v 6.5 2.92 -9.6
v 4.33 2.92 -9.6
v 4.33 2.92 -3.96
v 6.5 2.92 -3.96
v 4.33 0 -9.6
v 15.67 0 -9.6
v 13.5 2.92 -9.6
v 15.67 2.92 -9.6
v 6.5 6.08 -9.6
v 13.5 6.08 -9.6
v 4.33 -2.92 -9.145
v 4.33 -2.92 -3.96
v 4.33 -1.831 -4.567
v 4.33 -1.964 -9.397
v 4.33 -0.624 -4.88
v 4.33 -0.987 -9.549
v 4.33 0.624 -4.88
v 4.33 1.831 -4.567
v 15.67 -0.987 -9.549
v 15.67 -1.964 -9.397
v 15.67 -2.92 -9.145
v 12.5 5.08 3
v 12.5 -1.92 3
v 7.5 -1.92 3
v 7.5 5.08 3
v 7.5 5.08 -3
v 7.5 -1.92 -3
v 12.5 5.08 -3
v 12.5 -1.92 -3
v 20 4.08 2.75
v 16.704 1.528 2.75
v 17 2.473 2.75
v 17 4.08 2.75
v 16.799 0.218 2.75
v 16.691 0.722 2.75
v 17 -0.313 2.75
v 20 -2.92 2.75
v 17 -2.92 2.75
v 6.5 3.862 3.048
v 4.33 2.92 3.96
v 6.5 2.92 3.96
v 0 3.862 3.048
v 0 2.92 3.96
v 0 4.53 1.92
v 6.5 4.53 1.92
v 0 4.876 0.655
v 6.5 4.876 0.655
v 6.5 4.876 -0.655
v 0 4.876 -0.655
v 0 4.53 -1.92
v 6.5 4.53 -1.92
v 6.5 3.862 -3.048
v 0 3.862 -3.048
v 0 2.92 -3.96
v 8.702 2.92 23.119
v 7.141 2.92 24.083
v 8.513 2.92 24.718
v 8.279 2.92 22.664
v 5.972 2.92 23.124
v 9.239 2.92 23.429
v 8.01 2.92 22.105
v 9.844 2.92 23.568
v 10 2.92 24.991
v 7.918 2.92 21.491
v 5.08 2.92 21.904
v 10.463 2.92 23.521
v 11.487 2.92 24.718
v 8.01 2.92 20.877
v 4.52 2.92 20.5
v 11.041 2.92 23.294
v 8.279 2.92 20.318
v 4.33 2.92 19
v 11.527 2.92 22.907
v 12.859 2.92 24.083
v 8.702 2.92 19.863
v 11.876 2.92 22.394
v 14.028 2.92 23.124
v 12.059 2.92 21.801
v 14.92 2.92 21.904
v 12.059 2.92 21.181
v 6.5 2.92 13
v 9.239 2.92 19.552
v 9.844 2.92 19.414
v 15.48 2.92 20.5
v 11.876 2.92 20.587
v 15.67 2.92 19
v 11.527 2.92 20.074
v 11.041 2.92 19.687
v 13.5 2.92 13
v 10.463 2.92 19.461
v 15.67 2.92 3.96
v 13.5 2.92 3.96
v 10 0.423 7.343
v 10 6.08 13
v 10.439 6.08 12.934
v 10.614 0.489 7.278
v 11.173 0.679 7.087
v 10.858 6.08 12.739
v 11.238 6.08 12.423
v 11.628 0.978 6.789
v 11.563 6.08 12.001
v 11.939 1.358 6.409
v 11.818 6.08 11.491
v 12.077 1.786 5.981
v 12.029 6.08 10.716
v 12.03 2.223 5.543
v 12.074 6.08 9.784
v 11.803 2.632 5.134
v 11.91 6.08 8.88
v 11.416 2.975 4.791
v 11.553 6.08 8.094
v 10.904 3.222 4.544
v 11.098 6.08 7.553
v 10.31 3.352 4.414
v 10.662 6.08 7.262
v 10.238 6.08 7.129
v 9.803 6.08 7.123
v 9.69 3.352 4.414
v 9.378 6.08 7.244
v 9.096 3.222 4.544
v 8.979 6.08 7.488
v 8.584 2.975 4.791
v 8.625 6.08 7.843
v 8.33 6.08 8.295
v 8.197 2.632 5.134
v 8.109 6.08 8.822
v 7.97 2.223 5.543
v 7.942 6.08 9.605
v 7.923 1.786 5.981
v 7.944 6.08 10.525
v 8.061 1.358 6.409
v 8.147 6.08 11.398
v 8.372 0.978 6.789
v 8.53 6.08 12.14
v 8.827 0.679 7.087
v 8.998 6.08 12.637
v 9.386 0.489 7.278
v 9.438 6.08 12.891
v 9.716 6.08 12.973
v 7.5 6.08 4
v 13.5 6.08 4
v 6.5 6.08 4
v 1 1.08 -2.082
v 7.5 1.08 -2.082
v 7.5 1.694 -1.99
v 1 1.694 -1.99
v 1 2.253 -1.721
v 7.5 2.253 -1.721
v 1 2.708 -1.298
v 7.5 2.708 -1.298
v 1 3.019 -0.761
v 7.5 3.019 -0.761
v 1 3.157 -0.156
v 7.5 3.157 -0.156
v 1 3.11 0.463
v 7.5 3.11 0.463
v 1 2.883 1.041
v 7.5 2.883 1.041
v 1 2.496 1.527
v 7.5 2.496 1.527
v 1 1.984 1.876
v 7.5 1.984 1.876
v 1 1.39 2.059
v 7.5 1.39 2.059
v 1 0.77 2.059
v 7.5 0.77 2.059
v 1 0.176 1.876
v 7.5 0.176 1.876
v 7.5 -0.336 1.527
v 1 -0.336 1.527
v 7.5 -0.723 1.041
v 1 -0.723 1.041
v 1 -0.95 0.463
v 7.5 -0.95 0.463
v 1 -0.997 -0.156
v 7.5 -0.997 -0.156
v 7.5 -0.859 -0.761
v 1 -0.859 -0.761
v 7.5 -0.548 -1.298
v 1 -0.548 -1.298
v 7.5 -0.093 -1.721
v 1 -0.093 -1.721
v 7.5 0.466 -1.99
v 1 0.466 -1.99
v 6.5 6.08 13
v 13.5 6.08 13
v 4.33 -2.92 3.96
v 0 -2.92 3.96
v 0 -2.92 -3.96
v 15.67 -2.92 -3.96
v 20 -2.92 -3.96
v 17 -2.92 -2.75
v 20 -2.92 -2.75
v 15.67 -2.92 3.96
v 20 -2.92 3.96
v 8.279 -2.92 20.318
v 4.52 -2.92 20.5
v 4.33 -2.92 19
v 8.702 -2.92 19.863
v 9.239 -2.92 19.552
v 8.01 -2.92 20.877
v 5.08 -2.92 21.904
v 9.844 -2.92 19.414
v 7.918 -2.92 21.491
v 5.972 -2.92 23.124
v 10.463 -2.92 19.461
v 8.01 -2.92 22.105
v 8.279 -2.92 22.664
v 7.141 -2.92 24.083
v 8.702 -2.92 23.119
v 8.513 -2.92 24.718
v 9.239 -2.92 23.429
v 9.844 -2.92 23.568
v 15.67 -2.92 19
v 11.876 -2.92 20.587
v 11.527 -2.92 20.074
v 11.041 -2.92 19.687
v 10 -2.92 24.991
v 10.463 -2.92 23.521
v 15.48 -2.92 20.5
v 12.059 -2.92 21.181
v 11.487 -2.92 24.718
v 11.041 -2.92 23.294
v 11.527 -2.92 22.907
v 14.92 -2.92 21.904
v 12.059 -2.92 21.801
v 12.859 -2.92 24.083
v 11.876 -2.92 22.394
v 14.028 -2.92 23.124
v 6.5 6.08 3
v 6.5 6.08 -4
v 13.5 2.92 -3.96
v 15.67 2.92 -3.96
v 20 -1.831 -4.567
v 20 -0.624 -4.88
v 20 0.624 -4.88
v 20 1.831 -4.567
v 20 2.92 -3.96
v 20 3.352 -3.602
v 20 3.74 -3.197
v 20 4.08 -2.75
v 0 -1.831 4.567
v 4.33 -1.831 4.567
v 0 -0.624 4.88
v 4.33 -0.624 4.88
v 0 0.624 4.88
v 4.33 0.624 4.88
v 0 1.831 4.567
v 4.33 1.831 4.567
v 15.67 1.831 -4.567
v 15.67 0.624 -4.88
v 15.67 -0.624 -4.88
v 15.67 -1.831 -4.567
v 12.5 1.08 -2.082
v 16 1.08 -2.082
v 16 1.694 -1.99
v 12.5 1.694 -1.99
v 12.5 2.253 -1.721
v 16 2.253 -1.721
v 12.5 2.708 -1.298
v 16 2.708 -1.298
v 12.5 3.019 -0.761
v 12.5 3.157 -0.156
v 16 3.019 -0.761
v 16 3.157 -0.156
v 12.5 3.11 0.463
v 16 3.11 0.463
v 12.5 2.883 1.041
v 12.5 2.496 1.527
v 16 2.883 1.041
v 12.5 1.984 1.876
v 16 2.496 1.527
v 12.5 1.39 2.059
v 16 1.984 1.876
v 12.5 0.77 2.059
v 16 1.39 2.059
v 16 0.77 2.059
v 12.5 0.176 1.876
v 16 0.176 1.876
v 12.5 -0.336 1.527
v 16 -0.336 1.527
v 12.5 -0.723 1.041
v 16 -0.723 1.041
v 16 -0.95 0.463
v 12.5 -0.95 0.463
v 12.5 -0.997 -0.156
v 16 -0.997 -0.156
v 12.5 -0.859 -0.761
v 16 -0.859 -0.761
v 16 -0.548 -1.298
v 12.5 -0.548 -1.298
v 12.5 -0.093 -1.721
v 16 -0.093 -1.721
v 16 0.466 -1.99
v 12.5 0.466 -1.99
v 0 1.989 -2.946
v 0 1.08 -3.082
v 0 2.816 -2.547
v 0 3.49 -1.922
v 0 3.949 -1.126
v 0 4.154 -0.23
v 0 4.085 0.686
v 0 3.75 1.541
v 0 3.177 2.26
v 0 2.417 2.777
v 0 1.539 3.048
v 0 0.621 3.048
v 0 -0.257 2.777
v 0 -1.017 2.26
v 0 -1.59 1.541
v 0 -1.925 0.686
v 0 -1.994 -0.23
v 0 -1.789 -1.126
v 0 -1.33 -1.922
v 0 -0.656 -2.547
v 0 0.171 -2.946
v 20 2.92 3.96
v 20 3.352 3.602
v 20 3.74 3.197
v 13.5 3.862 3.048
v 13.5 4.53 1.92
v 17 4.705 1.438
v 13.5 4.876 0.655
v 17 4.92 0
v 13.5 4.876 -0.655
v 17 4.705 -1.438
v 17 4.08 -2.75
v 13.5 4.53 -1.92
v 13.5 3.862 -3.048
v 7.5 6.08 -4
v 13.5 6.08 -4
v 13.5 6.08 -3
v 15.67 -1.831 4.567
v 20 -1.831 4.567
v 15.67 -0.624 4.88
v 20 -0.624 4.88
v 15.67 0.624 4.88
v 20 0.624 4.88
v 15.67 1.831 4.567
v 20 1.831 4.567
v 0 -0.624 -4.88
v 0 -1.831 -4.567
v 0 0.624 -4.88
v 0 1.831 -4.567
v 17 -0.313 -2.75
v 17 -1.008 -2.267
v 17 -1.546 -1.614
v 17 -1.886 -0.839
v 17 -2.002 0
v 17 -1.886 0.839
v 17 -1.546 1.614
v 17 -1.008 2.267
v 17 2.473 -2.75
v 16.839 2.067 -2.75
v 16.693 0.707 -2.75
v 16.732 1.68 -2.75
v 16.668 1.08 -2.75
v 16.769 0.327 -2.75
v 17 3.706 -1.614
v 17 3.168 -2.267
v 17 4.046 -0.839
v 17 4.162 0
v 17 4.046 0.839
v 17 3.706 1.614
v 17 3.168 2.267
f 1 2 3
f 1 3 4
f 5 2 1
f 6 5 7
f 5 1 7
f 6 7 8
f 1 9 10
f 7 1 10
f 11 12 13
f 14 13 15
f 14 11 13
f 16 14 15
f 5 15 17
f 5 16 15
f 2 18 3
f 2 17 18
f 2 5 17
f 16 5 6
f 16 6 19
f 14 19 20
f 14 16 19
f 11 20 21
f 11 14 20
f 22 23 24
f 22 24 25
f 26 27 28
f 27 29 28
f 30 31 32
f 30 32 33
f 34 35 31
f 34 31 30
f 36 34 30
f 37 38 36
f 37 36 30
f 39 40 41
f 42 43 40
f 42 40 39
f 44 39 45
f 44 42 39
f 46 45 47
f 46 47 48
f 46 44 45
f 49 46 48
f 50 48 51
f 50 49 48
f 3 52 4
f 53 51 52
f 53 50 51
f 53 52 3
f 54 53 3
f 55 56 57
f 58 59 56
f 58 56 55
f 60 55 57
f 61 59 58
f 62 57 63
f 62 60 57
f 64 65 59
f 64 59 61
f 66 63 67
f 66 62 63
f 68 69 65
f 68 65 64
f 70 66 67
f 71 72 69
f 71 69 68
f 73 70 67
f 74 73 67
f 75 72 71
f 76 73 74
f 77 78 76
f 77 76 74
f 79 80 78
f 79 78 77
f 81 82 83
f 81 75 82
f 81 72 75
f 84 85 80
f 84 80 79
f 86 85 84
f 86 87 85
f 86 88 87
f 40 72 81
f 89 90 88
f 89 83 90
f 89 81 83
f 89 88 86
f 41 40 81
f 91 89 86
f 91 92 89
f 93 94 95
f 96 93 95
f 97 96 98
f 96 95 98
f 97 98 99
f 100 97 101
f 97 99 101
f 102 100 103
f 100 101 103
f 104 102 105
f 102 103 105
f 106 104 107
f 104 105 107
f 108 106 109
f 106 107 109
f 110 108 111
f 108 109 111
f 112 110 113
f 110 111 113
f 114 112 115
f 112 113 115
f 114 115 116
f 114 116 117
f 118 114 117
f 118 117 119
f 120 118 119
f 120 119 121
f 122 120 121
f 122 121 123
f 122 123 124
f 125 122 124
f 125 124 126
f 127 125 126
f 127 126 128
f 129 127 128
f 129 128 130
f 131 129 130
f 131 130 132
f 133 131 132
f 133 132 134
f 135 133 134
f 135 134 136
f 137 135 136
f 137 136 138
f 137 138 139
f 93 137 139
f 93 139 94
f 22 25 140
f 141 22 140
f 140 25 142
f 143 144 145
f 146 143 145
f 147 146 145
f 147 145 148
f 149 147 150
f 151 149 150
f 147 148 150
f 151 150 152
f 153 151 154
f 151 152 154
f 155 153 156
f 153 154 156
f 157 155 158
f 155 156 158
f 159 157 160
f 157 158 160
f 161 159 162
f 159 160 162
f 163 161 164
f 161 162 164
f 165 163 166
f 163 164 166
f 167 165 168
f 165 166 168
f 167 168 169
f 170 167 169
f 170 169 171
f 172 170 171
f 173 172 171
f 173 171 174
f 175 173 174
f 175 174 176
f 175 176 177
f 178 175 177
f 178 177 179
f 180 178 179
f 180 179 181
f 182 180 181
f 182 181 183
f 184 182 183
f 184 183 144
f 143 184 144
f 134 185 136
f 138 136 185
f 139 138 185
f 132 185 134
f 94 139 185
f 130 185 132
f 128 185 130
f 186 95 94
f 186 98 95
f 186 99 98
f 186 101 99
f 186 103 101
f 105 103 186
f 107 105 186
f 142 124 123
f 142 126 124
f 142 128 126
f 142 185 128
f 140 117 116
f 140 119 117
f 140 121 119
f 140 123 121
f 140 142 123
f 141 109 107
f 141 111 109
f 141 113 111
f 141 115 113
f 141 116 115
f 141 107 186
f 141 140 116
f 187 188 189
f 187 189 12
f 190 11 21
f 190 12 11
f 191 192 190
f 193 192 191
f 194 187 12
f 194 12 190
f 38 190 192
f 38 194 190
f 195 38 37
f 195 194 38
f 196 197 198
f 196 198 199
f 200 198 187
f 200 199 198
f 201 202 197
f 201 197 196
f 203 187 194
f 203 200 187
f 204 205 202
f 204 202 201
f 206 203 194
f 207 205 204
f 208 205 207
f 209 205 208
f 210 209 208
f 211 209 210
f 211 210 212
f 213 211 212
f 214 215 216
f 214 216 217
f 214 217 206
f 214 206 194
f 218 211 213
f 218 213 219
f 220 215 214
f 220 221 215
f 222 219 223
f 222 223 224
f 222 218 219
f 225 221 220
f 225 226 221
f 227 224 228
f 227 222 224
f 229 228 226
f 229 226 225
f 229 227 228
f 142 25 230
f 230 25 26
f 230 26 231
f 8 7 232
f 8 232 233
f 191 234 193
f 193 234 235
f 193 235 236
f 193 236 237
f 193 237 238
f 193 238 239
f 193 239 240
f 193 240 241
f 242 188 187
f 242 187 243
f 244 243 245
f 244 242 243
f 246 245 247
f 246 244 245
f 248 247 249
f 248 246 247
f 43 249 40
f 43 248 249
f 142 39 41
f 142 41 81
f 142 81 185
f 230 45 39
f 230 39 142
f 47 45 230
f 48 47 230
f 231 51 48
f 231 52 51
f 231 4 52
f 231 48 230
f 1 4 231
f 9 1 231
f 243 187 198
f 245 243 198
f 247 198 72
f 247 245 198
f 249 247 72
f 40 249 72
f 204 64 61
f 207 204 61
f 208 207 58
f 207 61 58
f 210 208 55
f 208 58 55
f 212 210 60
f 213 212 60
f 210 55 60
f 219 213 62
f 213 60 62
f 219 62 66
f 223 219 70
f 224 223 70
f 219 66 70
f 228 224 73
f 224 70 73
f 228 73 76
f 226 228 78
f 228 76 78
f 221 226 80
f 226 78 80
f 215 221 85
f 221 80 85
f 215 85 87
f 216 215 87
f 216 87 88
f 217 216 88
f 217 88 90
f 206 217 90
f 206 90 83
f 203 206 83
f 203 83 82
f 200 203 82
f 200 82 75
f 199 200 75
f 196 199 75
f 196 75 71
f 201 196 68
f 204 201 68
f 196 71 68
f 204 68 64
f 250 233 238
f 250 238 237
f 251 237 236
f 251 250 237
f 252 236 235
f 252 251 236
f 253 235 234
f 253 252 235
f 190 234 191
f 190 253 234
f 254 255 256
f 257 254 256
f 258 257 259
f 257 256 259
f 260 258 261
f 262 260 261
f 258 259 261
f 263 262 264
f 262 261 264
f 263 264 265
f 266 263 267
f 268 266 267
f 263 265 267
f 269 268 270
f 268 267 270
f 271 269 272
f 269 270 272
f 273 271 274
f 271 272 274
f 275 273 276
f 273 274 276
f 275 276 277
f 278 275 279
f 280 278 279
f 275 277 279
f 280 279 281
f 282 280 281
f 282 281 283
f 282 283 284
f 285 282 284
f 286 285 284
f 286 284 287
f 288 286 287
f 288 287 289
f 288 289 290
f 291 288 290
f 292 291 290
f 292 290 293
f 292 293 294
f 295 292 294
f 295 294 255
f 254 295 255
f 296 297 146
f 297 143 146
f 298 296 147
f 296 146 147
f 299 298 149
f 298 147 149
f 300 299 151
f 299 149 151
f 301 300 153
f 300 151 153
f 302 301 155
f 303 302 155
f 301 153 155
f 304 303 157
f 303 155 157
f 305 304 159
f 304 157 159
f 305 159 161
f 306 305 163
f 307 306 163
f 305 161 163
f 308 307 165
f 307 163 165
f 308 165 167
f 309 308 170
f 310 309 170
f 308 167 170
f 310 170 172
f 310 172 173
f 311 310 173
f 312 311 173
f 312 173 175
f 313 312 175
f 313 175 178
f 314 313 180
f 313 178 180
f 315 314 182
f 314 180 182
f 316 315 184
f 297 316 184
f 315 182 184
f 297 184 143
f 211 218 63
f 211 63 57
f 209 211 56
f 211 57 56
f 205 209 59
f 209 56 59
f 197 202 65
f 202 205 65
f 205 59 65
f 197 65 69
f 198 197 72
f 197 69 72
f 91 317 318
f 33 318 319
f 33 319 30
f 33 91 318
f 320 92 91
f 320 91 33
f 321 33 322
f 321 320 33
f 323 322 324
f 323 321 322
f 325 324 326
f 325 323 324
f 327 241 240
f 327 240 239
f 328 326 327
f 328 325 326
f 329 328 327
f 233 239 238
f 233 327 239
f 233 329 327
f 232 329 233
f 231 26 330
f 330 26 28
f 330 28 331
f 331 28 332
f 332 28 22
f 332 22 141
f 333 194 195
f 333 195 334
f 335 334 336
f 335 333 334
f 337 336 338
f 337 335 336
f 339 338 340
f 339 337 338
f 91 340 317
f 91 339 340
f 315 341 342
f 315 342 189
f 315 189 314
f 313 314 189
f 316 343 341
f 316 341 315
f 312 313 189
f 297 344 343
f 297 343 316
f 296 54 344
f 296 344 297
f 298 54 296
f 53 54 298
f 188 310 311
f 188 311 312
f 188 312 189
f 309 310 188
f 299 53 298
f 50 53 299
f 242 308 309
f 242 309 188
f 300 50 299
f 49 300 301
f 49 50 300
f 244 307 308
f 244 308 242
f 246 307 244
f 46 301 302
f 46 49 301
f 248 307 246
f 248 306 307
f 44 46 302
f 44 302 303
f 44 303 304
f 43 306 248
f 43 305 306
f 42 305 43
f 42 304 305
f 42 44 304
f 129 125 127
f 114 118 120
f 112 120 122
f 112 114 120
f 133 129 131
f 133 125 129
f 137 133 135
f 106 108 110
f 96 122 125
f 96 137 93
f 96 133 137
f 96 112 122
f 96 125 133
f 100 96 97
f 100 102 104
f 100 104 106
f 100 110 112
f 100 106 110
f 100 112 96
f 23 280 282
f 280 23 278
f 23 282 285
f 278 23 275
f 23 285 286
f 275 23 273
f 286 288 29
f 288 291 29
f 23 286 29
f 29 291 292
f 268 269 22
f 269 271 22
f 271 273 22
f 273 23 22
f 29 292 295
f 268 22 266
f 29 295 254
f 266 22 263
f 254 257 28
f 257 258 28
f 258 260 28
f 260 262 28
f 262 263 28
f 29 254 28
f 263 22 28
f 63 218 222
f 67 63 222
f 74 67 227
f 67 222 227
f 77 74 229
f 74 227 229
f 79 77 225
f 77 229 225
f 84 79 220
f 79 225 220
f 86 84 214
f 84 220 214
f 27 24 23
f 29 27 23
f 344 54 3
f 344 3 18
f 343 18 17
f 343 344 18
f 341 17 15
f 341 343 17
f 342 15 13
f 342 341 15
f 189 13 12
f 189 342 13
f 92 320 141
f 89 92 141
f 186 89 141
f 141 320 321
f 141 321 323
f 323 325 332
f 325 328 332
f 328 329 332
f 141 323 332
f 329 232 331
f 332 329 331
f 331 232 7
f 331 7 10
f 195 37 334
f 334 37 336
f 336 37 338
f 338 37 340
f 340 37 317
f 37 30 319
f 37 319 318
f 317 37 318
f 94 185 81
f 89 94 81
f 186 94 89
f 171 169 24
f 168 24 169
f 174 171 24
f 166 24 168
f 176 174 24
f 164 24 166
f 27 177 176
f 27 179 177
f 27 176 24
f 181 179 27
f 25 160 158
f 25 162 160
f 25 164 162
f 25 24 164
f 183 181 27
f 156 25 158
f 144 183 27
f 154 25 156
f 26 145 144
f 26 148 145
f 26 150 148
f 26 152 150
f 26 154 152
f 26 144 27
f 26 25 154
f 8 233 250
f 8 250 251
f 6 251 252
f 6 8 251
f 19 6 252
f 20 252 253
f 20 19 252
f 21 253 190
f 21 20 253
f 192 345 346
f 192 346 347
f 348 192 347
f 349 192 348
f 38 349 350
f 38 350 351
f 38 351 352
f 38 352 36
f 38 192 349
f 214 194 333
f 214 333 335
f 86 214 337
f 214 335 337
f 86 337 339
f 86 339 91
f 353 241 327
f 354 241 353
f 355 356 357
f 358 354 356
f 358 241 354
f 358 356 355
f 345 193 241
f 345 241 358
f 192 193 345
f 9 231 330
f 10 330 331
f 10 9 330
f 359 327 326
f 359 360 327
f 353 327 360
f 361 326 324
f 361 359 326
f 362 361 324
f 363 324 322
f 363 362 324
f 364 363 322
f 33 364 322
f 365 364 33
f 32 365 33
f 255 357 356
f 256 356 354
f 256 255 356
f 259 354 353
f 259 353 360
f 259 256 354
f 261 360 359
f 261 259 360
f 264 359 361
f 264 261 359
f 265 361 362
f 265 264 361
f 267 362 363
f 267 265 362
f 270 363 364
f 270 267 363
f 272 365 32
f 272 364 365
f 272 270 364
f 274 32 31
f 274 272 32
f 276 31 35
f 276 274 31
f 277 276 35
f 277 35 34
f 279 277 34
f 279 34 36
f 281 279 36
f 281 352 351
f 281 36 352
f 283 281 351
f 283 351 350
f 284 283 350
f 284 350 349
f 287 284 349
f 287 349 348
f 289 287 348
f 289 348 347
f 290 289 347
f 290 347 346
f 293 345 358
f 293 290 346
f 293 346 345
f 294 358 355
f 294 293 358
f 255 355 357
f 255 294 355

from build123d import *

# Parameters (mm, degrees)
BOSS_EXTRUDE1_DEPTH      = 20
SKETCH3_W                = 11.34
SKETCH3_H                = 5.84
BOSS_EXTRUDE2_DEPTH      = 25
FILLET1_R                = 6
SKETCH4_W                = 7
SKETCH4_H                = 8
BOSS_EXTRUDE3_DEPTH      = 9
BOSS_EXTRUDE4_DEPTH      = 13
BOSS_EXTRUDE4_DEPTH_BACK = 9.6
SKETCH10_W               = 7
SKETCH10_H               = 3.16
SKETCH5_W                = 5
SKETCH5_H                = 6
CUT_EXTRUDE1_DEPTH       = 9
SKETCH6_R                = 2.0825
CUT_EXTRUDE2_DEPTH       = 5.84
CUT_EXTRUDE3_REACH       = 34.581
SKETCH8_R                = 2.0825
CUT_EXTRUDE4_REACH       = 35.25
CUT_EXTRUDE4_END_RADIUS  = 4.92
CUT_EXTRUDE5_DEPTH       = 11.34
SKETCH13_R               = 2.0825
CUT_EXTRUDE7_DEPTH       = 8
SKETCH14_W               = 5
SKETCH14_H               = 6
BOSS_EXTRUDE5_DEPTH      = 1


with BuildPart() as part:
    # Sketch2 → Boss-Extrude1 (new body)
    with BuildSketch(Plane(origin=(0, 0, 0), x_dir=(0, 0, -1), z_dir=(1, 0, 0))):
        with BuildLine():
            Line((3.959797975, -2.92), (-3.959797975, -2.92))
            ThreePointArc((-3.959797975, -2.92), (-4.92, 0), (-3.959797975, 2.92))
            ThreePointArc((-3.959797975, 2.92), (0, 4.92), (3.959797975, 2.92))
            ThreePointArc((3.959797975, 2.92), (4.92, 0), (3.959797975, -2.92))
        make_face()
    extrude(amount=BOSS_EXTRUDE1_DEPTH)

    # Sketch3 → Boss-Extrude2 (add)
    with BuildSketch(Plane.XY):
        with Locations((10, 0)):
            Rectangle(SKETCH3_W, SKETCH3_H)
    extrude(amount=BOSS_EXTRUDE2_DEPTH)

    # Fillet1
    # the kernel refuses this fillet: 6 mm, written as the material it takes off along each edge
    with BuildSketch(Plane(origin=(15.67, -17.92, 25), x_dir=(0, 0, -1), z_dir=(0, 1, 0)), Plane(origin=(4.33, 17.92, 25), x_dir=(0, 0, -1), z_dir=(0, -1, 0))) as fillet1_piece_1:
        with BuildLine():
            CenterArc((FILLET1_R, FILLET1_R), FILLET1_R, 180, 90)
            Line((0, FILLET1_R), (0, 0))
            Line((0, 0), (FILLET1_R, 0))
        make_face()
    extrude(amount=35.84, mode=Mode.SUBTRACT)

    # Sketch4 → Boss-Extrude3 (add)
    with BuildSketch(Plane.XZ.offset(2.92)):
        with Locations((10, 0.040202025)):
            Rectangle(SKETCH4_W, SKETCH4_H)
    extrude(amount=-BOSS_EXTRUDE3_DEPTH)

    # Sketch10 → Boss-Extrude4 (add, two sides: drawn at the far end of the back side and taken through both)
    with BuildSketch(Plane.XY.offset(-BOSS_EXTRUDE4_DEPTH_BACK)):
        with Locations((10, 4.5)):
            Rectangle(SKETCH10_W, SKETCH10_H)
        Polygon((6.5, 2.92), (13.5, 2.92), (15.67, 2.92), (15.67, -2.92), (10, -2.92), (4.33, -2.92), (4.33, 2.92), align=None)
    extrude(amount=BOSS_EXTRUDE4_DEPTH + BOSS_EXTRUDE4_DEPTH_BACK)

    # Sketch5 → Cut-Extrude1 (cut)
    with BuildSketch(Plane(origin=(0, 6.08, 0), x_dir=(1, 0, 0), z_dir=(0, 1, 0))):
        with Locations((10, 0)):
            Rectangle(SKETCH5_W, SKETCH5_H)
    extrude(amount=-CUT_EXTRUDE1_DEPTH, mode=Mode.SUBTRACT)

    # Sketch6 → Cut-Extrude2 (cut)
    with BuildSketch(Plane(origin=(0, 2.92, 0), x_dir=(1, 0, 0), z_dir=(0, 1, 0))):
        with Locations(Location((10, -21.490918127, 0), (0, 0, 180))):
            Circle(SKETCH6_R)
    extrude(amount=-CUT_EXTRUDE2_DEPTH, mode=Mode.SUBTRACT)

    # Cut-Extrude3: up to this face of the body (flat: up to its plane)
    cut_extrude3_end = Plane(part.part.faces().sort_by_distance((0, 0.637144392, 0))[0])
    # Sketch8 → Cut-Extrude3 (cut, up to the picked face)
    with BuildSketch(Plane(origin=(20, 0, 0), x_dir=(0, 0, -1), z_dir=(1, 0, 0)), mode=Mode.PRIVATE) as cut_extrude3_sk1:
        with Locations((0, 1.08)):
            Circle(SKETCH8_R)
    cut_extrude3_tool1 = split(extrude(cut_extrude3_sk1.sketch, amount=-CUT_EXTRUDE3_REACH, mode=Mode.PRIVATE), bisect_by=cut_extrude3_end, keep=Keep.BOTH, mode=Mode.PRIVATE)
    add(cut_extrude3_tool1.solids().sort_by(Axis((20, 1.08, 0), (-1, 0, 0)))[0], mode=Mode.SUBTRACT)

    # Cut-Extrude4: up to this cylinder (the profile starts inside it)
    cut_extrude4_end = Plane(origin=(18.5, 0, 0), z_dir=(-1, 0, 0)) * Cylinder(CUT_EXTRUDE4_END_RADIUS, 81.34, mode=Mode.PRIVATE)
    # Sketch9 → Cut-Extrude4 (cut, up to the surface)
    with BuildSketch(Plane(origin=(0, -2.92, 0), x_dir=(1, 0, 0), z_dir=(0, 1, 0)), mode=Mode.PRIVATE) as cut_extrude4_sk1:
        Polygon((17, -2.75), (20, -2.75), (20, -2.0825), (20, 2.0825), (20, 2.75), (17, 2.75), align=None)
    cut_extrude4_tool1 = extrude(cut_extrude4_sk1.sketch, amount=CUT_EXTRUDE4_REACH, mode=Mode.PRIVATE) & cut_extrude4_end
    add(cut_extrude4_tool1.solids().sort_by_distance((18.5, -2.92, 0))[0], mode=Mode.SUBTRACT)

    # Chamfer1
    # the kernel refuses this chamfer: 1 mm, written as the material it takes off along each edge
    with BuildSketch(Plane(origin=(12.5, 6.08, 3), x_dir=(-0.027495876610585623, -0.9996219169112968, 0), z_dir=(0, 0, -1)), Plane(origin=(7.5, 6.08, -3), x_dir=(0.027495876610586487, -0.9996219169112968, 0), z_dir=(0, 0, 1))) as chamfer1_piece_1:
        with BuildLine():
            Line((1.028673195, 0), (-0.056547155, -1.027117794))
            Line((-0.056547155, -1.027117794), (-0.076539593, -1.026567876))
            ThreePointArc((-0.076539593, -1.026567876), (-0.034129227, -0.51339783), (-0.019992438, 0.000549918))
            Line((-0.019992438, 0.000549918), (0.000549918, 0.019992438))
            ThreePointArc((0.000549918, 0.019992438), (0.514497665, 0.00585565), (1.029223113, 0.019992438))
            Line((1.029223113, 0.019992438), (1.028673195, 0))
        make_face()
    extrude(amount=6, mode=Mode.SUBTRACT)
    with BuildSketch(Plane(origin=(12.5, 6.08, -3), x_dir=(0, -0.9996219169112968, 0.027495876610586487), z_dir=(-1, 0, 0)), Plane(origin=(7.5, 6.08, 3), x_dir=(0, -0.9996219169112968, -0.027495876610586487), z_dir=(1, 0, 0))) as chamfer1_piece_2:
        with BuildLine():
            Line((1.028673195, 0), (-0.056547155, -1.027117794))
            Line((-0.056547155, -1.027117794), (-0.076539593, -1.026567876))
            ThreePointArc((-0.076539593, -1.026567876), (-0.034129227, -0.51339783), (-0.019992438, 0.000549918))
            Line((-0.019992438, 0.000549918), (0.000549918, 0.019992438))
            ThreePointArc((0.000549918, 0.019992438), (0.514497665, 0.00585565), (1.029223113, 0.019992438))
            Line((1.029223113, 0.019992438), (1.028673195, 0))
        make_face()
    extrude(amount=5, mode=Mode.SUBTRACT)
    with BuildSketch(Plane(origin=(0, 1.08, 0), x_dir=(0, 0, -1), z_dir=(0, -1, 0))) as chamfer1_piece_3:
        with BuildLine():
            Line((3.110784271, -0.028284271), (2.054215729, 1.028284271))
            Line((2.054215729, 1.028284271), (2.034215729, 1.028284271))
            ThreePointArc((2.034215729, 1.028284271), (2.0625, 0.514142136), (2.0625, 0))
            Line((2.0625, 0), (2.0825, -0.02))
            ThreePointArc((2.0825, -0.02), (2.596642136, -0.02), (3.110784271, -0.048284271))
            Line((3.110784271, -0.048284271), (3.110784271, -0.028284271))
        make_face()
    revolve(axis=Axis((0, 1.08, 0), (1, 0, 0)), mode=Mode.SUBTRACT)
    with BuildSketch(Plane(origin=(17, 1.08, 0), x_dir=(0, 0, -1), z_dir=(0, -1, 0))) as chamfer1_piece_4_section:
        with BuildLine():
            Line((3.110784271, 0.028284271), (2.054215729, -1.028284271))
            Line((2.054215729, -1.028284271), (2.034215729, -1.028284271))
            ThreePointArc((2.034215729, -1.028284271), (2.0625, -0.514142136), (2.0625, 0))
            Line((2.0625, 0), (2.0825, 0.02))
            ThreePointArc((2.0825, 0.02), (2.596642136, 0.02), (3.110784271, 0.048284271))
            Line((3.110784271, 0.048284271), (3.110784271, 0.028284271))
        make_face()
    chamfer1_piece_4 = revolve(axis=Axis((17, 1.08, 0), (1, 0, 0)), mode=Mode.PRIVATE)
    chamfer1_piece_4 = split(chamfer1_piece_4, bisect_by=Plane(origin=(16.514214791, 1.08, -2.75), z_dir=(0, 0, 1)), keep=Keep.TOP, mode=Mode.PRIVATE)
    chamfer1_piece_4 = split(chamfer1_piece_4, bisect_by=Plane(origin=(16.514214791, 1.08, 2.75), z_dir=(0, 0, -1)), keep=Keep.TOP, mode=Mode.PRIVATE)
    add(chamfer1_piece_4, mode=Mode.SUBTRACT)
    with BuildSketch(Plane(origin=(7.5, 6.08, 3), x_dir=(0, -0.9996219169112968, -0.027495876610586487), z_dir=(1, 0, 0))) as chamfer1_piece_5a_section:
        with BuildLine():
            Line((1.028673195, 0), (-0.056547155, -1.027117794))
            Line((-0.056547155, -1.027117794), (-0.076539593, -1.026567876))
            ThreePointArc((-0.076539593, -1.026567876), (-0.034129227, -0.51339783), (-0.019992438, 0.000549918))
            Line((-0.019992438, 0.000549918), (0.000549918, 0.019992438))
            ThreePointArc((0.000549918, 0.019992438), (0.514497665, 0.00585565), (1.029223113, 0.019992438))
            Line((1.029223113, 0.019992438), (1.028673195, 0))
        make_face()
    chamfer1_piece_5a = extrude(amount=7.571682988, mode=Mode.PRIVATE)
    chamfer1_piece_5a = split(chamfer1_piece_5a, bisect_by=Plane(origin=(12.5, 5.750206373, 3.329793627), z_dir=(1, 0, 0)), keep=Keep.TOP, mode=Mode.PRIVATE)
    with BuildSketch(Plane(origin=(12.5, 6.08, 5.571682988), x_dir=(-0.027495876610585623, -0.9996219169112968, 0), z_dir=(0, 0, -1))) as chamfer1_piece_5b_section:
        with BuildLine():
            Line((1.028673195, 0), (-0.056547155, -1.027117794))
            Line((-0.056547155, -1.027117794), (-0.076539593, -1.026567876))
            ThreePointArc((-0.076539593, -1.026567876), (-0.034129227, -0.51339783), (-0.019992438, 0.000549918))
            Line((-0.019992438, 0.000549918), (0.000549918, 0.019992438))
            ThreePointArc((0.000549918, 0.019992438), (0.514497665, 0.00585565), (1.029223113, 0.019992438))
            Line((1.029223113, 0.019992438), (1.028673195, 0))
        make_face()
    chamfer1_piece_5b = extrude(amount=8.571682988, mode=Mode.PRIVATE)
    chamfer1_piece_5b = split(chamfer1_piece_5b, bisect_by=Plane(origin=(12.829793627, 5.750206373, 3), z_dir=(0, 0, 1)), keep=Keep.TOP, mode=Mode.PRIVATE)
    chamfer1_piece_5 = chamfer1_piece_5a & chamfer1_piece_5b
    add(chamfer1_piece_5, mode=Mode.SUBTRACT)
    with BuildSketch(Plane(origin=(15.071682988, 6.08, -3), x_dir=(0, -0.9996219169112968, 0.027495876610586487), z_dir=(-1, 0, 0))) as chamfer1_piece_6a_section:
        with BuildLine():
            Line((1.028673195, 0), (-0.056547155, -1.027117794))
            Line((-0.056547155, -1.027117794), (-0.076539593, -1.026567876))
            ThreePointArc((-0.076539593, -1.026567876), (-0.034129227, -0.51339783), (-0.019992438, 0.000549918))
            Line((-0.019992438, 0.000549918), (0.000549918, 0.019992438))
            ThreePointArc((0.000549918, 0.019992438), (0.514497665, 0.00585565), (1.029223113, 0.019992438))
            Line((1.029223113, 0.019992438), (1.028673195, 0))
        make_face()
    chamfer1_piece_6a = extrude(amount=7.571682988, mode=Mode.PRIVATE)
    chamfer1_piece_6a = split(chamfer1_piece_6a, bisect_by=Plane(origin=(12.5, 5.750206373, -3.329793627), z_dir=(1, 0, 0)), keep=Keep.TOP, mode=Mode.PRIVATE)
    with BuildSketch(Plane(origin=(12.5, 6.08, 3), x_dir=(-0.027495876610585623, -0.9996219169112968, 0), z_dir=(0, 0, -1))) as chamfer1_piece_6b_section:
        with BuildLine():
            Line((1.028673195, 0), (-0.056547155, -1.027117794))
            Line((-0.056547155, -1.027117794), (-0.076539593, -1.026567876))
            ThreePointArc((-0.076539593, -1.026567876), (-0.034129227, -0.51339783), (-0.019992438, 0.000549918))
            Line((-0.019992438, 0.000549918), (0.000549918, 0.019992438))
            ThreePointArc((0.000549918, 0.019992438), (0.514497665, 0.00585565), (1.029223113, 0.019992438))
            Line((1.029223113, 0.019992438), (1.028673195, 0))
        make_face()
    chamfer1_piece_6b = extrude(amount=8.571682988, mode=Mode.PRIVATE)
    chamfer1_piece_6b = split(chamfer1_piece_6b, bisect_by=Plane(origin=(12.829793627, 5.750206373, -3), z_dir=(0, 0, -1)), keep=Keep.TOP, mode=Mode.PRIVATE)
    chamfer1_piece_6 = chamfer1_piece_6a & chamfer1_piece_6b
    add(chamfer1_piece_6, mode=Mode.SUBTRACT)
    with BuildSketch(Plane(origin=(7.5, 6.08, -5.571682988), x_dir=(0.027495876610586487, -0.9996219169112968, 0), z_dir=(0, 0, 1))) as chamfer1_piece_7a_section:
        with BuildLine():
            Line((1.028673195, 0), (-0.056547155, -1.027117794))
            Line((-0.056547155, -1.027117794), (-0.076539593, -1.026567876))
            ThreePointArc((-0.076539593, -1.026567876), (-0.034129227, -0.51339783), (-0.019992438, 0.000549918))
            Line((-0.019992438, 0.000549918), (0.000549918, 0.019992438))
            ThreePointArc((0.000549918, 0.019992438), (0.514497665, 0.00585565), (1.029223113, 0.019992438))
            Line((1.029223113, 0.019992438), (1.028673195, 0))
        make_face()
    chamfer1_piece_7a = extrude(amount=8.571682988, mode=Mode.PRIVATE)
    chamfer1_piece_7a = split(chamfer1_piece_7a, bisect_by=Plane(origin=(7.170206373, 5.750206373, -3), z_dir=(0, 0, -1)), keep=Keep.TOP, mode=Mode.PRIVATE)
    with BuildSketch(Plane(origin=(12.5, 6.08, -3), x_dir=(0, -0.9996219169112968, 0.027495876610586487), z_dir=(-1, 0, 0))) as chamfer1_piece_7b_section:
        with BuildLine():
            Line((1.028673195, 0), (-0.056547155, -1.027117794))
            Line((-0.056547155, -1.027117794), (-0.076539593, -1.026567876))
            ThreePointArc((-0.076539593, -1.026567876), (-0.034129227, -0.51339783), (-0.019992438, 0.000549918))
            Line((-0.019992438, 0.000549918), (0.000549918, 0.019992438))
            ThreePointArc((0.000549918, 0.019992438), (0.514497665, 0.00585565), (1.029223113, 0.019992438))
            Line((1.029223113, 0.019992438), (1.028673195, 0))
        make_face()
    chamfer1_piece_7b = extrude(amount=7.571682988, mode=Mode.PRIVATE)
    chamfer1_piece_7b = split(chamfer1_piece_7b, bisect_by=Plane(origin=(7.5, 5.750206373, -3.329793627), z_dir=(-1, 0, 0)), keep=Keep.TOP, mode=Mode.PRIVATE)
    chamfer1_piece_7 = chamfer1_piece_7a & chamfer1_piece_7b
    add(chamfer1_piece_7, mode=Mode.SUBTRACT)
    with BuildSketch(Plane(origin=(7.5, 6.08, -3), x_dir=(0.027495876610586487, -0.9996219169112968, 0), z_dir=(0, 0, 1))) as chamfer1_piece_8a_section:
        with BuildLine():
            Line((1.028673195, 0), (-0.056547155, -1.027117794))
            Line((-0.056547155, -1.027117794), (-0.076539593, -1.026567876))
            ThreePointArc((-0.076539593, -1.026567876), (-0.034129227, -0.51339783), (-0.019992438, 0.000549918))
            Line((-0.019992438, 0.000549918), (0.000549918, 0.019992438))
            ThreePointArc((0.000549918, 0.019992438), (0.514497665, 0.00585565), (1.029223113, 0.019992438))
            Line((1.029223113, 0.019992438), (1.028673195, 0))
        make_face()
    chamfer1_piece_8a = extrude(amount=8.571682988, mode=Mode.PRIVATE)
    chamfer1_piece_8a = split(chamfer1_piece_8a, bisect_by=Plane(origin=(7.170206373, 5.750206373, 3), z_dir=(0, 0, 1)), keep=Keep.TOP, mode=Mode.PRIVATE)
    with BuildSketch(Plane(origin=(4.928317012, 6.08, 3), x_dir=(0, -0.9996219169112968, -0.027495876610586487), z_dir=(1, 0, 0))) as chamfer1_piece_8b_section:
        with BuildLine():
            Line((1.028673195, 0), (-0.056547155, -1.027117794))
            Line((-0.056547155, -1.027117794), (-0.076539593, -1.026567876))
            ThreePointArc((-0.076539593, -1.026567876), (-0.034129227, -0.51339783), (-0.019992438, 0.000549918))
            Line((-0.019992438, 0.000549918), (0.000549918, 0.019992438))
            ThreePointArc((0.000549918, 0.019992438), (0.514497665, 0.00585565), (1.029223113, 0.019992438))
            Line((1.029223113, 0.019992438), (1.028673195, 0))
        make_face()
    chamfer1_piece_8b = extrude(amount=7.571682988, mode=Mode.PRIVATE)
    chamfer1_piece_8b = split(chamfer1_piece_8b, bisect_by=Plane(origin=(7.5, 5.750206373, 3.329793627), z_dir=(-1, 0, 0)), keep=Keep.TOP, mode=Mode.PRIVATE)
    chamfer1_piece_8 = chamfer1_piece_8a & chamfer1_piece_8b
    add(chamfer1_piece_8, mode=Mode.SUBTRACT)

    # Sketch11 → Cut-Extrude5 (cut)
    with BuildSketch(Plane.ZY.offset(-4.33)):
        with BuildLine():
            Line((-9.145140786, -2.92), (-9.6, -2.92))
            Line((-9.6, -2.92), (-9.6, 0))
            ThreePointArc((-9.6, 0), (-9.485603606, -1.477607602), (-9.145140786, -2.92))
        make_face()
    extrude(amount=-CUT_EXTRUDE5_DEPTH, mode=Mode.SUBTRACT)

    # Sketch13 → Cut-Extrude7 (cut)
    with BuildSketch(Plane(origin=(0, 9.54, 9.54), x_dir=(-1, 0, 0), z_dir=(0, 0.7071067811865464, 0.7071067811865488))):
        with Locations(Location((-10, 2.810678926, 0), (0, 0, 90))):
            Circle(SKETCH13_R)
    extrude(amount=-CUT_EXTRUDE7_DEPTH, mode=Mode.SUBTRACT)

    # Sketch14 → Boss-Extrude5 (add)
    with BuildSketch(Plane.XZ.offset(2.92)):
        with Locations((10, 0)):
            Rectangle(SKETCH14_W, SKETCH14_H)
    extrude(amount=-BOSS_EXTRUDE5_DEPTH)


solid = part.part
